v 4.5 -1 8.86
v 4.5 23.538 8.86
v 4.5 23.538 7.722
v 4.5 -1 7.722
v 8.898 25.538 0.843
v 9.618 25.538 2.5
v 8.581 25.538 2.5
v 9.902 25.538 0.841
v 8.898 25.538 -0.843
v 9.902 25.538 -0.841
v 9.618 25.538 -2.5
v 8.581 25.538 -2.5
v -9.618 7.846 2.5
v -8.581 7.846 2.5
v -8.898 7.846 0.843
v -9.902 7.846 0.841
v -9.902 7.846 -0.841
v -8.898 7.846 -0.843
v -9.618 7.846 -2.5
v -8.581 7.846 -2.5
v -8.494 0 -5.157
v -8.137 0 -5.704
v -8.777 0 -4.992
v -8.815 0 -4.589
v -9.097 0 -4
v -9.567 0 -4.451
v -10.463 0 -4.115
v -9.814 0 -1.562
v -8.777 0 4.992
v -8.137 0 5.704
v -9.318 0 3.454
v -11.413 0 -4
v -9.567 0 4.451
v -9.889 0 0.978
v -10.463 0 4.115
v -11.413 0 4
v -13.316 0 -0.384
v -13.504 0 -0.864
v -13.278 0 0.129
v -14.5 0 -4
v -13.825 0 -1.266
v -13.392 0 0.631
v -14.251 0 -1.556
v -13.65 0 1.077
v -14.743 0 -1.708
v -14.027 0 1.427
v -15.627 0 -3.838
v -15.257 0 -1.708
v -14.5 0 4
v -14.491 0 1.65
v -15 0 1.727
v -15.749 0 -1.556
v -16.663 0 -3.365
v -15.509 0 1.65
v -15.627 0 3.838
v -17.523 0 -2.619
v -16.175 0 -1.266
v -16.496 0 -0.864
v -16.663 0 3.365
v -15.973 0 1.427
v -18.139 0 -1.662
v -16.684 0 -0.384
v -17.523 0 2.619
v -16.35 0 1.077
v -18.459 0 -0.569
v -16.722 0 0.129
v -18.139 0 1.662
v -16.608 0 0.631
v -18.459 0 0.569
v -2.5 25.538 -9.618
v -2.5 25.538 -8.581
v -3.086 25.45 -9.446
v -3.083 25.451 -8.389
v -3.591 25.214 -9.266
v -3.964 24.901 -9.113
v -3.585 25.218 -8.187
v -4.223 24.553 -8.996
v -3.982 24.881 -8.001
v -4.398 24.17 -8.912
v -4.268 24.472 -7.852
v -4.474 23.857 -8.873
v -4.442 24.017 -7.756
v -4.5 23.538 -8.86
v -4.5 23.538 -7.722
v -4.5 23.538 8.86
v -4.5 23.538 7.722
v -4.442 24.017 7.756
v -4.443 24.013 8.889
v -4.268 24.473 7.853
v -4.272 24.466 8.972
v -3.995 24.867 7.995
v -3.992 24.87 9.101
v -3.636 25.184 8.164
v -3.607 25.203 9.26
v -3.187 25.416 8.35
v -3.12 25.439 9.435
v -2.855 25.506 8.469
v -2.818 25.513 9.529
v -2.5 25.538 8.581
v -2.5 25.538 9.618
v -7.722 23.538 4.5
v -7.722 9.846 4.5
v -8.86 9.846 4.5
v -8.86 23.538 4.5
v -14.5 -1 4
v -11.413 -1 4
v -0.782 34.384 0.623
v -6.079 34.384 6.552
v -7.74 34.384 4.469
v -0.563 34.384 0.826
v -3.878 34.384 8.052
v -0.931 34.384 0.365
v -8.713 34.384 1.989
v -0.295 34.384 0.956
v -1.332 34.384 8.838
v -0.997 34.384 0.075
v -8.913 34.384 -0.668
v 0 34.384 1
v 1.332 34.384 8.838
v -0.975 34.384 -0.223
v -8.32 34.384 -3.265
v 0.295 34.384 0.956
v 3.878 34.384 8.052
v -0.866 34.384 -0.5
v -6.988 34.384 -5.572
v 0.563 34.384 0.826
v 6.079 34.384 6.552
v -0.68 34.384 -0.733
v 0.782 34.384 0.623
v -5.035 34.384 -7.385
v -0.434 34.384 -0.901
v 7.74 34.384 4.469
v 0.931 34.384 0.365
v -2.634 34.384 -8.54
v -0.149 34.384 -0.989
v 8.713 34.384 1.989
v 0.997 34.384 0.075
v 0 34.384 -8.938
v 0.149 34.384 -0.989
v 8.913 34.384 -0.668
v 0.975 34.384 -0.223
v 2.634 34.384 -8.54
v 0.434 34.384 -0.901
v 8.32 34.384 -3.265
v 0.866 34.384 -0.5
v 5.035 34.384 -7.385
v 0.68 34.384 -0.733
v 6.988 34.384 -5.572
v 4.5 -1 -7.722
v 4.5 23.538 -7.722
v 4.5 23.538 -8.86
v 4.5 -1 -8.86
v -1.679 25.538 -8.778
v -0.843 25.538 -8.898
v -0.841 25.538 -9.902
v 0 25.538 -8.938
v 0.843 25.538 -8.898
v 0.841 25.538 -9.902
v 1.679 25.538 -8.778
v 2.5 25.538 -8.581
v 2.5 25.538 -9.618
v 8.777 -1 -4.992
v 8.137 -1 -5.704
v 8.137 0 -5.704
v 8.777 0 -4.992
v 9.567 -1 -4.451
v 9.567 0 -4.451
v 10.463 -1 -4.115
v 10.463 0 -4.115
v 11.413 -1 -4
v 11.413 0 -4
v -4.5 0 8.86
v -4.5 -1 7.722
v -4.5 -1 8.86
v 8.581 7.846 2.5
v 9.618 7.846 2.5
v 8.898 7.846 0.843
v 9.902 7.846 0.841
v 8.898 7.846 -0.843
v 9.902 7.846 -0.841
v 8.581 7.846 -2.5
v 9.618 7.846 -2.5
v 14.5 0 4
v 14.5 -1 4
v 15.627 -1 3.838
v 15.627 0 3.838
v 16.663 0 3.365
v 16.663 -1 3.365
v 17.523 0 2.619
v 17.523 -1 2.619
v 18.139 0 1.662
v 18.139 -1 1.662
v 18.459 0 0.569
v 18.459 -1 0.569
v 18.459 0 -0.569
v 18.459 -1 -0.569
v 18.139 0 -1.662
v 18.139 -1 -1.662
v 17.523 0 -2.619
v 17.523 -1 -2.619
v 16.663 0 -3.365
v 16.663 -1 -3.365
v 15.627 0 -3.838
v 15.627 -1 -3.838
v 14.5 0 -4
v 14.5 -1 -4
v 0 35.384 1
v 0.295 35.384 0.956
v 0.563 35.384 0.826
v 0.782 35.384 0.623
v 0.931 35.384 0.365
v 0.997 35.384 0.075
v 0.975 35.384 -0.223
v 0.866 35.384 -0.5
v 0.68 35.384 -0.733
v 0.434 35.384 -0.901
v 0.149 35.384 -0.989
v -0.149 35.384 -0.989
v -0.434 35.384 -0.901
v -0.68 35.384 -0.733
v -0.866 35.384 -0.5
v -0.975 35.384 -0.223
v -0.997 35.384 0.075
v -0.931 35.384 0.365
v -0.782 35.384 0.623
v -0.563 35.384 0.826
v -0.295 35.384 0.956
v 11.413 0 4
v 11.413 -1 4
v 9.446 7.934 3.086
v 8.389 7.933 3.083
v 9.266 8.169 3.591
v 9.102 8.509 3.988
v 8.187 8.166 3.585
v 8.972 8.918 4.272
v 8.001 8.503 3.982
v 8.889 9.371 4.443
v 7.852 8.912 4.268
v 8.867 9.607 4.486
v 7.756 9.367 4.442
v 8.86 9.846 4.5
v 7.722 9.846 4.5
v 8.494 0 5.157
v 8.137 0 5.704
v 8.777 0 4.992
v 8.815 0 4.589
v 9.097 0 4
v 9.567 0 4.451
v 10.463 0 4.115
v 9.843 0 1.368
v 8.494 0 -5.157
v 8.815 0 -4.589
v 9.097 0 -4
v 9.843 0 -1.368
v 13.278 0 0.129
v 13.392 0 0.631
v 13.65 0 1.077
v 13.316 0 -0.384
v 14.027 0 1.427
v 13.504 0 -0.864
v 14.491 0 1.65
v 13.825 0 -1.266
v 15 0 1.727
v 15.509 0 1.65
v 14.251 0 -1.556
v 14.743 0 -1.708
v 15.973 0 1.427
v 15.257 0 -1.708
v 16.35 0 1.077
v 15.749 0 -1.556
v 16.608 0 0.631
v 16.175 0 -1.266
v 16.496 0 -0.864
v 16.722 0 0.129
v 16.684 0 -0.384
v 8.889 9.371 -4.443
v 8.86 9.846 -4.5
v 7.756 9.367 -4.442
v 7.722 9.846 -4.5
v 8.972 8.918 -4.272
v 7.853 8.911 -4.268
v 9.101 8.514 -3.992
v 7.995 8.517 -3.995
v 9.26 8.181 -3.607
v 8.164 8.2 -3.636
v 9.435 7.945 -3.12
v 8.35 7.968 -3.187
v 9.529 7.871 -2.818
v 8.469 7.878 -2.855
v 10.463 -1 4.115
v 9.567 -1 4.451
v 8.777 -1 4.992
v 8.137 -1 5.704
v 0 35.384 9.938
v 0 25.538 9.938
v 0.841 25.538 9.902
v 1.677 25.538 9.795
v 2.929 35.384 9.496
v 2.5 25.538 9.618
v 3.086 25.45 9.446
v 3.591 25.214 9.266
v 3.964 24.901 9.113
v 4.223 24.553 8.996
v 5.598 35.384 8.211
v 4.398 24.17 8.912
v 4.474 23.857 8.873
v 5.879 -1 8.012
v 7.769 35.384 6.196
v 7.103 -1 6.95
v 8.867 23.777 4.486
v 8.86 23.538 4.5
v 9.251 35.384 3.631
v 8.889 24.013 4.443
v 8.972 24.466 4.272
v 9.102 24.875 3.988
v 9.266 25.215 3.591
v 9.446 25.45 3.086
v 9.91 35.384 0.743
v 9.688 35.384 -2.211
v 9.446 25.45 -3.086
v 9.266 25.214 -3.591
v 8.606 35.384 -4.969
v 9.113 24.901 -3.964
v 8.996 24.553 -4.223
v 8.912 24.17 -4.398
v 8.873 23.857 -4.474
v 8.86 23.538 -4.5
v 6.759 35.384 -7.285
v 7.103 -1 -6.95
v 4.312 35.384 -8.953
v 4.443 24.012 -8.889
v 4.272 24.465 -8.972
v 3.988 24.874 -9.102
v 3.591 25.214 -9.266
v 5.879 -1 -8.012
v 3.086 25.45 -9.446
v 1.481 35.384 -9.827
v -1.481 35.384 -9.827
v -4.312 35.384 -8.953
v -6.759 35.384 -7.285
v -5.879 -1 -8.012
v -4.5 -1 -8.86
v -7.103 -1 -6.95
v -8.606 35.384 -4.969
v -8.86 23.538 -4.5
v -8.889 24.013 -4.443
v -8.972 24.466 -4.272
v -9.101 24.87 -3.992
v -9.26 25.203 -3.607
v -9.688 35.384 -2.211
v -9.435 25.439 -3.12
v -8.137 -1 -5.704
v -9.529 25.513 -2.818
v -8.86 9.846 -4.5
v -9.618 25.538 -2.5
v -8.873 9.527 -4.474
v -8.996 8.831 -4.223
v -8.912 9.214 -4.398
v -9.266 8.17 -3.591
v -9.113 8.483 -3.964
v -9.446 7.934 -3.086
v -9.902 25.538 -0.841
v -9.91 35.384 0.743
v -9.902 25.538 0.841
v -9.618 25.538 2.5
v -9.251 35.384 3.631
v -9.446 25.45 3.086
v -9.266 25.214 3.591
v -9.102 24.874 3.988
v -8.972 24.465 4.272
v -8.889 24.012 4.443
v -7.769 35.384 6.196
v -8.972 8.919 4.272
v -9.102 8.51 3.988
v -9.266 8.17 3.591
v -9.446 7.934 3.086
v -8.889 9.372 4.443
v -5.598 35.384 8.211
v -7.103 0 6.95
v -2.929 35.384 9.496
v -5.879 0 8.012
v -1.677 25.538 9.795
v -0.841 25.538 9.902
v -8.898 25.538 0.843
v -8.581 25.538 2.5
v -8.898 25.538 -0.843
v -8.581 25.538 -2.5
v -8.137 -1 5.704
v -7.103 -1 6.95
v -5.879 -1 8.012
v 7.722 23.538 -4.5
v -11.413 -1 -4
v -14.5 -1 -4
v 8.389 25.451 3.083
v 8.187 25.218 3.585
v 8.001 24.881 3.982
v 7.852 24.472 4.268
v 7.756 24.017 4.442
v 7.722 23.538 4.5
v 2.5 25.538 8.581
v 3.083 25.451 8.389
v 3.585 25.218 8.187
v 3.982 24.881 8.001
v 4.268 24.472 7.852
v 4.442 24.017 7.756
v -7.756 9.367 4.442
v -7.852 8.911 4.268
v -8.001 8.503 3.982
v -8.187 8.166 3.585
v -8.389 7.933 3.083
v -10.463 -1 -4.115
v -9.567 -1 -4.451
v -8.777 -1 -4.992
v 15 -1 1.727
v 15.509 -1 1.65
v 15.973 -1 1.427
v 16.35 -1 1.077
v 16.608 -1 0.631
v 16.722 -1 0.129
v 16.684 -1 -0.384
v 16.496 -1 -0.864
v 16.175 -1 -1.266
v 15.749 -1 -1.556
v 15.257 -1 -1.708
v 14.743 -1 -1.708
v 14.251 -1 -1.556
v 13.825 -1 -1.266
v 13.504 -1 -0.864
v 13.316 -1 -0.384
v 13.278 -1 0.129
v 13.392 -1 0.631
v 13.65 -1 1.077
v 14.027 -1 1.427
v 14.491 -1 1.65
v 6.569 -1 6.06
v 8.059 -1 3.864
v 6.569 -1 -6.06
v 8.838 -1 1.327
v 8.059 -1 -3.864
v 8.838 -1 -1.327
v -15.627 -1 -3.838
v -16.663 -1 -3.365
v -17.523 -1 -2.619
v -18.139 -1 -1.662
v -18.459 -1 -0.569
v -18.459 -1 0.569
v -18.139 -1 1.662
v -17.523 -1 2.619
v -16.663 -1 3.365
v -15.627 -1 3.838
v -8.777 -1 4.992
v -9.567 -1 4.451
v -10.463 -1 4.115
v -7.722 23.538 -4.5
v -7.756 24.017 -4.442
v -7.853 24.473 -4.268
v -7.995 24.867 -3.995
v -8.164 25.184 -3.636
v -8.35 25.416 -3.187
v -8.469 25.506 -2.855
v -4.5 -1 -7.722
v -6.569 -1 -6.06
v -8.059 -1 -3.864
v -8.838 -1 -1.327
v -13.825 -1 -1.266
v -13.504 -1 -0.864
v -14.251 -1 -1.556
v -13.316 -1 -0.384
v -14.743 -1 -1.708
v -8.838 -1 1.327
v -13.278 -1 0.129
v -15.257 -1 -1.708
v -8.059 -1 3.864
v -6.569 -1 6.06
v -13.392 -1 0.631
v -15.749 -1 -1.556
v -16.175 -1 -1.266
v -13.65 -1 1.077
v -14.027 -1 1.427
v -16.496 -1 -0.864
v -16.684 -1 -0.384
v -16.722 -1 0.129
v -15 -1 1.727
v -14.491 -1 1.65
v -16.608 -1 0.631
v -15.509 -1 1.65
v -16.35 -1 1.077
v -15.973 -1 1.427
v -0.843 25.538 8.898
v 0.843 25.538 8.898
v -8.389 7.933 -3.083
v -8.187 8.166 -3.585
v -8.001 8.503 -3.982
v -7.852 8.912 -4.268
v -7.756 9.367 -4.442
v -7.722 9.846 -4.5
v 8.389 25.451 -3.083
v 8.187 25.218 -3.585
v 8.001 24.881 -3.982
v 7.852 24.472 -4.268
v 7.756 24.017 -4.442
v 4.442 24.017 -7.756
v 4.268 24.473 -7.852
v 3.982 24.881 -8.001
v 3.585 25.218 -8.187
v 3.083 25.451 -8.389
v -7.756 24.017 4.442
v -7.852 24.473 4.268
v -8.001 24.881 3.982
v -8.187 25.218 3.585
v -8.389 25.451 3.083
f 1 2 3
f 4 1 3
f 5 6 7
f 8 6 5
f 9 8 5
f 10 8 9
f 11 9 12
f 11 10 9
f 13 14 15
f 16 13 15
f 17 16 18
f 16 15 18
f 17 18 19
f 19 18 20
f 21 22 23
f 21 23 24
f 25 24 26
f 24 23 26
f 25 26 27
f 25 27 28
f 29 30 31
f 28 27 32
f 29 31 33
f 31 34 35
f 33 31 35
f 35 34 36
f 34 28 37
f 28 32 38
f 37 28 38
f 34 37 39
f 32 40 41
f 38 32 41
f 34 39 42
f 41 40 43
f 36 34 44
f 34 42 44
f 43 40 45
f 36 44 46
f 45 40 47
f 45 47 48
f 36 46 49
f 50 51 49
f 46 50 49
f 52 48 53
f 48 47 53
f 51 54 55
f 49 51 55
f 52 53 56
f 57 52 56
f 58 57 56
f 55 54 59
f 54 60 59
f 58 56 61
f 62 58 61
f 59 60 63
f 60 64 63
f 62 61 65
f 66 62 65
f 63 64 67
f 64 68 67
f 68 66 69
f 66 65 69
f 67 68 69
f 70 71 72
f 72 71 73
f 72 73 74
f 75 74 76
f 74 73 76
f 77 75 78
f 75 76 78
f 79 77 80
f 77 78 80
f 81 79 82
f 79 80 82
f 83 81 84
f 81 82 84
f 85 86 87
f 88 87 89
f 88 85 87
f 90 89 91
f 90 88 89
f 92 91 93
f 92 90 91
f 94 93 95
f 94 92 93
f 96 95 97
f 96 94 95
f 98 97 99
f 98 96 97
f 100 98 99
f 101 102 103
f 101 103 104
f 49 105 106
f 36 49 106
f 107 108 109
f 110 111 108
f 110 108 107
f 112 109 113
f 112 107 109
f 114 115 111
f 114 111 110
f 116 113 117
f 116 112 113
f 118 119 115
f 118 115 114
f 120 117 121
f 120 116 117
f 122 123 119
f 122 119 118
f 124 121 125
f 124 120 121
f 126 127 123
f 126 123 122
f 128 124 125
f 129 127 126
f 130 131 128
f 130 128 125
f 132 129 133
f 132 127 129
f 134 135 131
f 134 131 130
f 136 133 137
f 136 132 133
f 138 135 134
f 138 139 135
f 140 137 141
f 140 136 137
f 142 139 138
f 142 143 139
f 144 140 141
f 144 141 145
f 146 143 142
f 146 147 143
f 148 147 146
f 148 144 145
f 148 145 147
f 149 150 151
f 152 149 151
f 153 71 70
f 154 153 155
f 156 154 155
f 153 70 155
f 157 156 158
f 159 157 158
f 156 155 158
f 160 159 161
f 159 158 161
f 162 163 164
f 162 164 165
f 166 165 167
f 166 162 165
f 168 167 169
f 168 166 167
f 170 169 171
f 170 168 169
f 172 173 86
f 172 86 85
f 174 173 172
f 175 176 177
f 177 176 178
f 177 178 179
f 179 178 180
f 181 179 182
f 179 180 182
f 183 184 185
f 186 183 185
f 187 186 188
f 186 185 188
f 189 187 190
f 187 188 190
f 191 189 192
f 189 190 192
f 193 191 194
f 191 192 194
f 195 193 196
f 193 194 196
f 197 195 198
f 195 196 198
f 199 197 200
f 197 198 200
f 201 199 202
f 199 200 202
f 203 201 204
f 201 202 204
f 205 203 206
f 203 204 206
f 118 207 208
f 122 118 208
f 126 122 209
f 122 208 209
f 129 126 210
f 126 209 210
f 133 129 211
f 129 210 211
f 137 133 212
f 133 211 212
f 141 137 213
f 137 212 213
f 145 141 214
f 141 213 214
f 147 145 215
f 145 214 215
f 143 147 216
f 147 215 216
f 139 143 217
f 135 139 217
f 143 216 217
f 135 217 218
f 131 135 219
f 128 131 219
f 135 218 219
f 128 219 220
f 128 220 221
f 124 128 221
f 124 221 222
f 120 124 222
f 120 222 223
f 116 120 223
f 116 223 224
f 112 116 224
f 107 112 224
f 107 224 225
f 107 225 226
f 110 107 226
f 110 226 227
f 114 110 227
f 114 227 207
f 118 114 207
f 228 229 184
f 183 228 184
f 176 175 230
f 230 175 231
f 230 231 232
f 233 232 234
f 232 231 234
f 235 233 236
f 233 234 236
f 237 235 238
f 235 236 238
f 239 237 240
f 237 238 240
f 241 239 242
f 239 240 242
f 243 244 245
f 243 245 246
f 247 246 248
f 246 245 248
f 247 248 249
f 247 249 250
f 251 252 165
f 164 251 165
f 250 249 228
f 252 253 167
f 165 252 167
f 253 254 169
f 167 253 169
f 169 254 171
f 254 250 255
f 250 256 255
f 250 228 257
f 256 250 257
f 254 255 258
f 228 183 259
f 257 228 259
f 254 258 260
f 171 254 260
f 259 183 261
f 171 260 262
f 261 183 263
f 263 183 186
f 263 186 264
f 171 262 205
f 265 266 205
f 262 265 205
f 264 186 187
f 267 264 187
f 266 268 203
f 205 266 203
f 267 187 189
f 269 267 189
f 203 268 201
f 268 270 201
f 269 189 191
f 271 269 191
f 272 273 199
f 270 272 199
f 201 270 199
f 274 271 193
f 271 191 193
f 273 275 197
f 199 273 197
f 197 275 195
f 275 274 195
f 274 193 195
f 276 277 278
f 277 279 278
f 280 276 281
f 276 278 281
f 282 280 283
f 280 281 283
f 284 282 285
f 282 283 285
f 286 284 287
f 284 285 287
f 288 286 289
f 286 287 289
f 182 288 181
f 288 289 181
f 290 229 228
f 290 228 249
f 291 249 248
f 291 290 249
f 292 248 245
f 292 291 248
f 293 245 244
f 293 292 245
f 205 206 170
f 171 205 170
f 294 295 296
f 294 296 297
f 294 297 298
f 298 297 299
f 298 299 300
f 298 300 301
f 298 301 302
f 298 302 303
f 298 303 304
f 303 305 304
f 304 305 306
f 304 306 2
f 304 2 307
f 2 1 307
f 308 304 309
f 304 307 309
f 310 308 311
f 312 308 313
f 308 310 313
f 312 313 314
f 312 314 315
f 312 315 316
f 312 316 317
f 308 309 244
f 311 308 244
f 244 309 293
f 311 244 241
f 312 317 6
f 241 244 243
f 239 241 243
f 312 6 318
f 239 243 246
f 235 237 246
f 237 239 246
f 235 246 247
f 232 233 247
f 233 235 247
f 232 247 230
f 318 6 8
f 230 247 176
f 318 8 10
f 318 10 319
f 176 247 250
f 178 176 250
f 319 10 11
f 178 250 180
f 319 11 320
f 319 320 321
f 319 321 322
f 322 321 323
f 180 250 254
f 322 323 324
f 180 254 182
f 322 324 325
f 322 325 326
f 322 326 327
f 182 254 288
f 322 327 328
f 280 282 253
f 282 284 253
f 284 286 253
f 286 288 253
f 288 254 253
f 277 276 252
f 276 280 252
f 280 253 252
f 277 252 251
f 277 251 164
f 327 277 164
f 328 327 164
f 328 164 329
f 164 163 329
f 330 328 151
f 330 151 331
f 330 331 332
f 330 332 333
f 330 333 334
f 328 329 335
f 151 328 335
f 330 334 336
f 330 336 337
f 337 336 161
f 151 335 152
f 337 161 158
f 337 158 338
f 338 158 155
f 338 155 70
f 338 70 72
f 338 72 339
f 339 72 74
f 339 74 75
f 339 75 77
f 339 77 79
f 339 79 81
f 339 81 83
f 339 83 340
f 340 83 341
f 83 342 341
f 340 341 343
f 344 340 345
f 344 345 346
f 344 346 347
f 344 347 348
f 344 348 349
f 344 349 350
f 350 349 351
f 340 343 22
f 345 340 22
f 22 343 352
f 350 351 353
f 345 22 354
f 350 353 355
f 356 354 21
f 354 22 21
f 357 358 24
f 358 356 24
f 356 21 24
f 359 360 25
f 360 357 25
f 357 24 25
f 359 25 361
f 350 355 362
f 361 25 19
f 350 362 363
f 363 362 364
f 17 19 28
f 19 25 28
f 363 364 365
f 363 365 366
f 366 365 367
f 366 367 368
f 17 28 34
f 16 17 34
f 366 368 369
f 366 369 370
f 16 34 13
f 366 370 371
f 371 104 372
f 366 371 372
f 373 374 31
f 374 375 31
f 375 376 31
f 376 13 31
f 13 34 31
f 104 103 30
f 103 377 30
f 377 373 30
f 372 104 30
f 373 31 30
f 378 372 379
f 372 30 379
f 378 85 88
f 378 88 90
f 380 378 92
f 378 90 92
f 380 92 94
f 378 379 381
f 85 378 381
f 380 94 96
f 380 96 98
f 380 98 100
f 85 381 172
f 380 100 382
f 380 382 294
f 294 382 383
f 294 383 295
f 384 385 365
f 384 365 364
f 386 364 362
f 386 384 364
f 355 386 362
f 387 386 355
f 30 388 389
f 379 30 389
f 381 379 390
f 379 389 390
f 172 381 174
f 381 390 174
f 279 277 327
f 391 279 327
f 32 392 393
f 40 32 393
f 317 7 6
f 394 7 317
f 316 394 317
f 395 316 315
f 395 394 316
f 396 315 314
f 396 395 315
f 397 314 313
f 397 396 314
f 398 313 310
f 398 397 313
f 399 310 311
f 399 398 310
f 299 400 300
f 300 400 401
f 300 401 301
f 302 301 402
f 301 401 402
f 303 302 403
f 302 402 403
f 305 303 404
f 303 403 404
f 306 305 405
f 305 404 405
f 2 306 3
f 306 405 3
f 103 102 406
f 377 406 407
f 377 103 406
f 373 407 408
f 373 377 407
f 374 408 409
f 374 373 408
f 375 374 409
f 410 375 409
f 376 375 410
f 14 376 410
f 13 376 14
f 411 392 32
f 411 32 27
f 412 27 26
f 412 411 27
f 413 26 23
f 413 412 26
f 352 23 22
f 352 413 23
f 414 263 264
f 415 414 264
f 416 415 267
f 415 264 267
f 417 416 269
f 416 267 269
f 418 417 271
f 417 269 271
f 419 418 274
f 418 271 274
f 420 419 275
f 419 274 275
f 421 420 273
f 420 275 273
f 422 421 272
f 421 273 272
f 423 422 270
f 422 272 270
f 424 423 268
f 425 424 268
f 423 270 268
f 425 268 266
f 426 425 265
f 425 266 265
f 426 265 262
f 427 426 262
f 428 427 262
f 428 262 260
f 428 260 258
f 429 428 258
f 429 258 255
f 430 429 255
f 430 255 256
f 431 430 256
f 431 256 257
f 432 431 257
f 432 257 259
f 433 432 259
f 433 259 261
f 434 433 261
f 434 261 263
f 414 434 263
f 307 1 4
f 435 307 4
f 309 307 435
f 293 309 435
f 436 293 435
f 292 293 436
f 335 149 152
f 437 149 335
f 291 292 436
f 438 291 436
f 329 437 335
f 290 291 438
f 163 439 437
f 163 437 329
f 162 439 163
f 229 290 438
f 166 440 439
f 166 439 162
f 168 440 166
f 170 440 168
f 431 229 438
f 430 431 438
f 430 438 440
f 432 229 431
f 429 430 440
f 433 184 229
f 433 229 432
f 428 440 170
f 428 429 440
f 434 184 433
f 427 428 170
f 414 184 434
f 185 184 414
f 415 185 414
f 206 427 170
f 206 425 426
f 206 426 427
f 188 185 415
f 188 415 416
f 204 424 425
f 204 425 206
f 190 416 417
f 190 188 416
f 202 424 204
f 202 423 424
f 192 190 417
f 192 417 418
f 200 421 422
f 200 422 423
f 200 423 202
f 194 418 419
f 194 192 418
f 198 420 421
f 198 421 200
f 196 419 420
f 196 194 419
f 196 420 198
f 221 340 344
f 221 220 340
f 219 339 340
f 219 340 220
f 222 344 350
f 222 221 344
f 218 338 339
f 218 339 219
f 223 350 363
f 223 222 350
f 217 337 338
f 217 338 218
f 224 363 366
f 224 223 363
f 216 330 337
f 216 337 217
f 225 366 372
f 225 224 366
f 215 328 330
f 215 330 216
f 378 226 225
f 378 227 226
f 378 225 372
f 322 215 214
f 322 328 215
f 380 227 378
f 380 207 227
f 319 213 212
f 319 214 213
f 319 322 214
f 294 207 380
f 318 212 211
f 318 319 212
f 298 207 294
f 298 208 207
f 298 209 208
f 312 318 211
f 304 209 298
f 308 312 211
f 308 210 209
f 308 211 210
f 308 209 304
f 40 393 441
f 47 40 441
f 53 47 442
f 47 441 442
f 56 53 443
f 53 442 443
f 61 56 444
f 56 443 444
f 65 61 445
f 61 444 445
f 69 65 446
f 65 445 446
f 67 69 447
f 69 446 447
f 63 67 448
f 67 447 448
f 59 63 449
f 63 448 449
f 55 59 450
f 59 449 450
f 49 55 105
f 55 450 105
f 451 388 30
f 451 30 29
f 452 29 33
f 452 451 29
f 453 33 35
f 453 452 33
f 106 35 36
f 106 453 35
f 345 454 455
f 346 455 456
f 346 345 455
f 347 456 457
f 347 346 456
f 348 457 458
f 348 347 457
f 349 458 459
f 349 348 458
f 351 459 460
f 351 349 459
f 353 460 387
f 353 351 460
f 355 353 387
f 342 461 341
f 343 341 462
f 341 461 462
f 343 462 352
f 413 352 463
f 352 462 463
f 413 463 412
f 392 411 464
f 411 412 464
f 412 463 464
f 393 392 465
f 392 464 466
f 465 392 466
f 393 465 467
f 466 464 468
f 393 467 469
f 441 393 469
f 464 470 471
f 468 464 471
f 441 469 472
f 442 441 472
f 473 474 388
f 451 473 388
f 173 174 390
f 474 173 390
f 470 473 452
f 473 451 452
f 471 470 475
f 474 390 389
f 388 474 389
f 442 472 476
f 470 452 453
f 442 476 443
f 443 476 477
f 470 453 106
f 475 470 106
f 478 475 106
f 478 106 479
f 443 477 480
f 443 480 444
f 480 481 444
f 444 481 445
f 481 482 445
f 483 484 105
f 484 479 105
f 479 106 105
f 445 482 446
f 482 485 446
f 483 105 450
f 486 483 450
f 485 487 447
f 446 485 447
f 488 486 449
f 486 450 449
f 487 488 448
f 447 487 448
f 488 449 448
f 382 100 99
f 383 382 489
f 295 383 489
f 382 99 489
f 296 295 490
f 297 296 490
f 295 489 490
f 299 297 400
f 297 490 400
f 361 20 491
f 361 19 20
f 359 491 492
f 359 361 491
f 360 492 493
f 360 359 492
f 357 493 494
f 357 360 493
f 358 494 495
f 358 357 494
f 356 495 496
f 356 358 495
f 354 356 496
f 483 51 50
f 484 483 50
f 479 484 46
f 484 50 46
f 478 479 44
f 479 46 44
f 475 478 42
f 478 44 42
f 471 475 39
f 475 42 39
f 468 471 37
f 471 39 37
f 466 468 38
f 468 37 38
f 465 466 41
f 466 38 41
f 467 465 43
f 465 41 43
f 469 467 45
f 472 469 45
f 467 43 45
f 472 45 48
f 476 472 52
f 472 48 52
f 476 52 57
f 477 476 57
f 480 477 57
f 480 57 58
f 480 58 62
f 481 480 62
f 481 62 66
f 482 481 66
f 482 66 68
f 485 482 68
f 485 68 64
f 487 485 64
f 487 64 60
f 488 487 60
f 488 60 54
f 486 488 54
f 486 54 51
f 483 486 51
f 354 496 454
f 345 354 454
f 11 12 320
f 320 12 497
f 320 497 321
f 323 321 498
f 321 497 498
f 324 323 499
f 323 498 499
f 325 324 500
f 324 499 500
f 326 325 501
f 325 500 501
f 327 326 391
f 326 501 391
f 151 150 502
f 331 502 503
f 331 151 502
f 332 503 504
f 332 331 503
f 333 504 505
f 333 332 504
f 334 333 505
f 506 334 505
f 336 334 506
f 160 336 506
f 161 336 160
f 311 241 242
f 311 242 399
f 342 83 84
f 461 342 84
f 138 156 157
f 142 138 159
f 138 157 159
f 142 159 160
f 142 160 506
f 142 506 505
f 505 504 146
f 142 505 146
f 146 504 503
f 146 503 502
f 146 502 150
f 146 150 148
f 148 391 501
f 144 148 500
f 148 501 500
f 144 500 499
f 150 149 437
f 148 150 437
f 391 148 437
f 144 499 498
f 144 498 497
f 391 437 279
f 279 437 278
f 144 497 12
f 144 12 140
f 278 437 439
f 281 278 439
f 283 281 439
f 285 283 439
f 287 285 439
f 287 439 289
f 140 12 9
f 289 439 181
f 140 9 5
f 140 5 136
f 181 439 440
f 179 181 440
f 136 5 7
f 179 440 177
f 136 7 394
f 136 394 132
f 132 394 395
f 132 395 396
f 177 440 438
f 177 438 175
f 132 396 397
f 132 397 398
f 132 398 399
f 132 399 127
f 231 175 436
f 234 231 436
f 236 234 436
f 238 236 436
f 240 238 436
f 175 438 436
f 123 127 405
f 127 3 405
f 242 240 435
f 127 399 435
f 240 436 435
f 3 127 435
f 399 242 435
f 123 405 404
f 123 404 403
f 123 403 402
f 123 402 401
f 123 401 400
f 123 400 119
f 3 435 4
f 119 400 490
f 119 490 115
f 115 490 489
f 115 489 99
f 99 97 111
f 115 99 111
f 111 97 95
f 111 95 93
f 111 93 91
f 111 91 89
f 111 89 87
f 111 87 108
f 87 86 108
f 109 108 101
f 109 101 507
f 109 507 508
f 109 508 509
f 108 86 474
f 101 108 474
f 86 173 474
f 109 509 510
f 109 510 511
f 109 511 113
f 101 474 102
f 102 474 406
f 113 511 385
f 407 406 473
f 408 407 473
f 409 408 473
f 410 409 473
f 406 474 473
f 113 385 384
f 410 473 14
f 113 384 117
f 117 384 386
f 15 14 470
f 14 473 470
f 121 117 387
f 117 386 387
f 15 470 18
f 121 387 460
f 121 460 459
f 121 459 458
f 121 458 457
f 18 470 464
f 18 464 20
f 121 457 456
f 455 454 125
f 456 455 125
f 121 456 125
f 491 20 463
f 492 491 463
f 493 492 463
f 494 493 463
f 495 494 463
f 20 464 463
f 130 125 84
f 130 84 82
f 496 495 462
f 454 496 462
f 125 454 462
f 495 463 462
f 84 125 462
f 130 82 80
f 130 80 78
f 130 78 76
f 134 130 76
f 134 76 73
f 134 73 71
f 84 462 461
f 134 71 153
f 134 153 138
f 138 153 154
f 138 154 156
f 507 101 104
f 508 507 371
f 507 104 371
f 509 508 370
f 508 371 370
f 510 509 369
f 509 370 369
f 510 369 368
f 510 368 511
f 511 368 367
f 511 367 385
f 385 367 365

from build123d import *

# Parameters (mm, degrees)
SKETCH2_R           = 9.9375
BOSS_EXTRUDE1_DEPTH = 35.384
SKETCH4_R           = 1
CUT_EXTRUDE2_DEPTH  = 39.072762817
BOSS_EXTRUDE2_START = 1
SKETCH11_R          = 8.9375
BOSS_EXTRUDE2_DEPTH = 1
SKETCH12_R          = 8.9375
CUT_EXTRUDE7_DEPTH  = 34.384
CUT_EXTRUDE8_START  = -1
CUT_EXTRUDE8_DEPTH  = 26.538
SKETCH14_W          = 9
SKETCH14_H          = 17.692
CUT_EXTRUDE9_DEPTH  = 61.852537846
FILLET3_R           = 2
FILLET4_R           = 4
CUT_EXTRUDE10_REACH = 43.146
SKETCH15_R          = 1.7272


# Read off the part's stored shape, not the designer's step: Cut-Extrude8
with BuildPart() as part:
    # Sketch2 → Boss-Extrude1 (new body)
    with BuildSketch(Plane(origin=(0, 0, 0), x_dir=(1, 0, 0), z_dir=(0, 1, 0))):
        with Locations(Location((0, 0, 0), (0, 0, 270))):
            Circle(SKETCH2_R)
    extrude(amount=BOSS_EXTRUDE1_DEPTH)

    # Sketch4 → Cut-Extrude2 (cut, through all)
    with BuildSketch(Plane(origin=(0, 35.384, 0), x_dir=(1, 0, 0), z_dir=(0, 1, 0))):
        with Locations(Location((0, 0, 0), (0, 0, 270))):
            Circle(SKETCH4_R)
    extrude(amount=-CUT_EXTRUDE2_DEPTH, mode=Mode.SUBTRACT)

    # Sketch11 → Boss-Extrude2 (add)
    with BuildSketch(Plane.XZ.offset(BOSS_EXTRUDE2_START)):
        with BuildLine():
            Line((9.096917404, 4), (18.5, 4))
            Line((18.5, 4), (18.5, -4))
            Line((18.5, -4), (9.096917404, -4))
            ThreePointArc((9.096917404, -4), (0, -9.9375), (-9.096917404, -4))
            Line((-9.096917404, -4), (-18.5, -4))
            Line((-18.5, -4), (-18.5, 4))
            Line((-18.5, 4), (-9.096917404, 4))
            ThreePointArc((-9.096917404, 4), (0, 9.9375), (9.096917404, 4))
        make_face()
        with Locations(Location((0, 0, 0), (0, 0, 270))):
            Circle(SKETCH11_R, mode=Mode.SUBTRACT)
    extrude(amount=-BOSS_EXTRUDE2_DEPTH)

    # Sketch12 → Cut-Extrude7 (cut)
    with BuildSketch(Plane.XZ):
        with Locations(Location((0, 0, 0), (0, 0, 270))):
            Circle(SKETCH12_R)
    extrude(amount=-CUT_EXTRUDE7_DEPTH, mode=Mode.SUBTRACT)

    # Cut-Extrude8 outline → Cut-Extrude8 (cut)
    with BuildSketch(Plane(origin=(0, 0, 0), x_dir=(1, 0, 0), z_dir=(0, 1, 0)).offset(CUT_EXTRUDE8_START)):
        with BuildLine():
            ThreePointArc((4.5, -7.721975541), (0, -8.9375), (-4.5, -7.721975541))
            Line((-4.5, -7.721975541), (-4.5, -8.860243013))
            ThreePointArc((-4.5, -8.860243013), (0, -9.9375), (4.5, -8.860243013))
            Line((4.5, -8.860243013), (4.5, -7.721975541))
        make_face()
        with BuildLine():
            Line((-4.5, 8.860243013), (-4.5, 7.721975541))
            ThreePointArc((-4.5, 7.721975541), (0, 8.9375), (4.5, 7.721975541))
            Line((4.5, 7.721975541), (4.5, 8.860243013))
            ThreePointArc((4.5, 8.860243013), (0, 9.9375), (-4.5, 8.860243013))
        make_face()
    extrude(amount=CUT_EXTRUDE8_DEPTH, mode=Mode.SUBTRACT)

    # Sketch14 → Cut-Extrude9 (cut, through all)
    with BuildSketch(Plane(origin=(30, 0, 0), x_dir=(0, 0, -1), z_dir=(1, 0, 0))):
        with Locations((0, 16.692)):
            Rectangle(SKETCH14_W, SKETCH14_H)
    extrude(amount=-CUT_EXTRUDE9_DEPTH, mode=Mode.SUBTRACT)

    # Fillet3
    fillet3_edges = [part.edges().sort_by_distance(p)[0] for p in [
        (4.5, 25.538, 8.291109277),
        (4.5, 25.538, -8.291109277),
        (-4.5, 25.538, -8.291109277),
        (-4.5, 25.538, 8.291109277),
        (8.291109277, 25.538, -4.5),
        (-8.291109277, 25.538, -4.5),
        (8.291109277, 7.846, -4.5),
        (-8.291109277, 7.846, -4.5),
        (-8.291109277, 7.846, 4.5),
        (8.291109277, 7.846, 4.5),
        (8.291109277, 25.538, 4.5),
        (-8.291109277, 25.538, 4.5),
    ]]
    fillet(fillet3_edges, radius=FILLET3_R)

    # Fillet4
    # the kernel refuses this fillet: 4 mm, written as the material it adds along each edge
    with BuildSketch(Plane(origin=(9.096917404, -1, -4), x_dir=(-0.4906341894667762, 0, -0.8713656477772574), z_dir=(0, 1, 0)), Plane(origin=(-9.096917404, -1, 4), x_dir=(0.49063418946677706, 0, 0.871365647777257), z_dir=(0, 1, 0))) as fillet4_piece_1:
        with BuildLine():
            CenterArc((2.349170519, -3.980589921), FILLET4_R, 95.646730554, 54.970995912)
            Line((-1.136292073, -2.018053163), (0, 0))
            ThreePointArc((0, 0), (0.977796106, -0.048221916), (1.955592212, 0))
        make_face()
    extrude(amount=1)
    with BuildSketch(Plane(origin=(9.096917404, -1, 4), x_dir=(-0.4906341894667768, 0, 0.8713656477772572), z_dir=(0, 1, 0)), Plane(origin=(-9.096917404, -1, -4), x_dir=(0.4906341894667772, 0, -0.8713656477772569), z_dir=(0, 1, 0))) as fillet4_piece_2:
        with BuildLine():
            CenterArc((2.349170519, 3.980589921), FILLET4_R, 209.382273534, 54.970995912)
            Line((-1.136292073, 2.018053163), (0, 0))
            ThreePointArc((0, 0), (0.977796106, 0.048221916), (1.955592212, 0))
        make_face()
    extrude(amount=1)
    # the kernel refuses this fillet: 4 mm, written as the material it takes off along each edge
    with BuildSketch(Plane(origin=(18.5, -11, -4), x_dir=(0, 0, 1), z_dir=(0, 1, 0)), Plane(origin=(18.5, -11, 4), x_dir=(-1, 0, 0), z_dir=(0, 1, 0))) as fillet4_2_piece_1:
        with BuildLine():
            CenterArc((FILLET4_R, -FILLET4_R), FILLET4_R, 90, 90)
            Line((0, -FILLET4_R), (0, 0))
            Line((0, 0), (FILLET4_R, 0))
        make_face()
    extrude(amount=21, mode=Mode.SUBTRACT)
    with BuildSketch(Plane(origin=(-18.5, -11, -4), x_dir=(0, 0, 1), z_dir=(0, 1, 0)), Plane(origin=(-18.5, -11, 4), x_dir=(1, 0, 0), z_dir=(0, 1, 0))) as fillet4_2_piece_2:
        with BuildLine():
            CenterArc((FILLET4_R, FILLET4_R), FILLET4_R, 180, 90)
            Line((0, FILLET4_R), (0, 0))
            Line((0, 0), (FILLET4_R, 0))
        make_face()
    extrude(amount=21, mode=Mode.SUBTRACT)

    # Sketch15 → Cut-Extrude10 (cut, up to next)
    with BuildSketch(Plane(origin=(0, 0, 0), x_dir=(1, 0, 0), z_dir=(0, 1, 0)), mode=Mode.PRIVATE) as cut_extrude10_sk1:
        with Locations(Location((-15, 0, 0), (0, 0, 270))):
            Circle(SKETCH15_R)
    cut_extrude10_tool1 = extrude(cut_extrude10_sk1.sketch, amount=-CUT_EXTRUDE10_REACH, mode=Mode.PRIVATE) & part.part
    # Sketch15 → Cut-Extrude10 (cut, up to next)
    with BuildSketch(Plane(origin=(0, 0, 0), x_dir=(1, 0, 0), z_dir=(0, 1, 0)), mode=Mode.PRIVATE) as cut_extrude10_sk2:
        with Locations(Location((15, 0, 0), (0, 0, 270))):
            Circle(SKETCH15_R)
    cut_extrude10_tool2 = extrude(cut_extrude10_sk2.sketch, amount=-CUT_EXTRUDE10_REACH, mode=Mode.PRIVATE) & part.part
    add(cut_extrude10_tool1.solids().sort_by_distance((-15, 0, 0))[0], mode=Mode.SUBTRACT)
    add(cut_extrude10_tool2.solids().sort_by_distance((15, 0, 0))[0], mode=Mode.SUBTRACT)


solid = part.part
